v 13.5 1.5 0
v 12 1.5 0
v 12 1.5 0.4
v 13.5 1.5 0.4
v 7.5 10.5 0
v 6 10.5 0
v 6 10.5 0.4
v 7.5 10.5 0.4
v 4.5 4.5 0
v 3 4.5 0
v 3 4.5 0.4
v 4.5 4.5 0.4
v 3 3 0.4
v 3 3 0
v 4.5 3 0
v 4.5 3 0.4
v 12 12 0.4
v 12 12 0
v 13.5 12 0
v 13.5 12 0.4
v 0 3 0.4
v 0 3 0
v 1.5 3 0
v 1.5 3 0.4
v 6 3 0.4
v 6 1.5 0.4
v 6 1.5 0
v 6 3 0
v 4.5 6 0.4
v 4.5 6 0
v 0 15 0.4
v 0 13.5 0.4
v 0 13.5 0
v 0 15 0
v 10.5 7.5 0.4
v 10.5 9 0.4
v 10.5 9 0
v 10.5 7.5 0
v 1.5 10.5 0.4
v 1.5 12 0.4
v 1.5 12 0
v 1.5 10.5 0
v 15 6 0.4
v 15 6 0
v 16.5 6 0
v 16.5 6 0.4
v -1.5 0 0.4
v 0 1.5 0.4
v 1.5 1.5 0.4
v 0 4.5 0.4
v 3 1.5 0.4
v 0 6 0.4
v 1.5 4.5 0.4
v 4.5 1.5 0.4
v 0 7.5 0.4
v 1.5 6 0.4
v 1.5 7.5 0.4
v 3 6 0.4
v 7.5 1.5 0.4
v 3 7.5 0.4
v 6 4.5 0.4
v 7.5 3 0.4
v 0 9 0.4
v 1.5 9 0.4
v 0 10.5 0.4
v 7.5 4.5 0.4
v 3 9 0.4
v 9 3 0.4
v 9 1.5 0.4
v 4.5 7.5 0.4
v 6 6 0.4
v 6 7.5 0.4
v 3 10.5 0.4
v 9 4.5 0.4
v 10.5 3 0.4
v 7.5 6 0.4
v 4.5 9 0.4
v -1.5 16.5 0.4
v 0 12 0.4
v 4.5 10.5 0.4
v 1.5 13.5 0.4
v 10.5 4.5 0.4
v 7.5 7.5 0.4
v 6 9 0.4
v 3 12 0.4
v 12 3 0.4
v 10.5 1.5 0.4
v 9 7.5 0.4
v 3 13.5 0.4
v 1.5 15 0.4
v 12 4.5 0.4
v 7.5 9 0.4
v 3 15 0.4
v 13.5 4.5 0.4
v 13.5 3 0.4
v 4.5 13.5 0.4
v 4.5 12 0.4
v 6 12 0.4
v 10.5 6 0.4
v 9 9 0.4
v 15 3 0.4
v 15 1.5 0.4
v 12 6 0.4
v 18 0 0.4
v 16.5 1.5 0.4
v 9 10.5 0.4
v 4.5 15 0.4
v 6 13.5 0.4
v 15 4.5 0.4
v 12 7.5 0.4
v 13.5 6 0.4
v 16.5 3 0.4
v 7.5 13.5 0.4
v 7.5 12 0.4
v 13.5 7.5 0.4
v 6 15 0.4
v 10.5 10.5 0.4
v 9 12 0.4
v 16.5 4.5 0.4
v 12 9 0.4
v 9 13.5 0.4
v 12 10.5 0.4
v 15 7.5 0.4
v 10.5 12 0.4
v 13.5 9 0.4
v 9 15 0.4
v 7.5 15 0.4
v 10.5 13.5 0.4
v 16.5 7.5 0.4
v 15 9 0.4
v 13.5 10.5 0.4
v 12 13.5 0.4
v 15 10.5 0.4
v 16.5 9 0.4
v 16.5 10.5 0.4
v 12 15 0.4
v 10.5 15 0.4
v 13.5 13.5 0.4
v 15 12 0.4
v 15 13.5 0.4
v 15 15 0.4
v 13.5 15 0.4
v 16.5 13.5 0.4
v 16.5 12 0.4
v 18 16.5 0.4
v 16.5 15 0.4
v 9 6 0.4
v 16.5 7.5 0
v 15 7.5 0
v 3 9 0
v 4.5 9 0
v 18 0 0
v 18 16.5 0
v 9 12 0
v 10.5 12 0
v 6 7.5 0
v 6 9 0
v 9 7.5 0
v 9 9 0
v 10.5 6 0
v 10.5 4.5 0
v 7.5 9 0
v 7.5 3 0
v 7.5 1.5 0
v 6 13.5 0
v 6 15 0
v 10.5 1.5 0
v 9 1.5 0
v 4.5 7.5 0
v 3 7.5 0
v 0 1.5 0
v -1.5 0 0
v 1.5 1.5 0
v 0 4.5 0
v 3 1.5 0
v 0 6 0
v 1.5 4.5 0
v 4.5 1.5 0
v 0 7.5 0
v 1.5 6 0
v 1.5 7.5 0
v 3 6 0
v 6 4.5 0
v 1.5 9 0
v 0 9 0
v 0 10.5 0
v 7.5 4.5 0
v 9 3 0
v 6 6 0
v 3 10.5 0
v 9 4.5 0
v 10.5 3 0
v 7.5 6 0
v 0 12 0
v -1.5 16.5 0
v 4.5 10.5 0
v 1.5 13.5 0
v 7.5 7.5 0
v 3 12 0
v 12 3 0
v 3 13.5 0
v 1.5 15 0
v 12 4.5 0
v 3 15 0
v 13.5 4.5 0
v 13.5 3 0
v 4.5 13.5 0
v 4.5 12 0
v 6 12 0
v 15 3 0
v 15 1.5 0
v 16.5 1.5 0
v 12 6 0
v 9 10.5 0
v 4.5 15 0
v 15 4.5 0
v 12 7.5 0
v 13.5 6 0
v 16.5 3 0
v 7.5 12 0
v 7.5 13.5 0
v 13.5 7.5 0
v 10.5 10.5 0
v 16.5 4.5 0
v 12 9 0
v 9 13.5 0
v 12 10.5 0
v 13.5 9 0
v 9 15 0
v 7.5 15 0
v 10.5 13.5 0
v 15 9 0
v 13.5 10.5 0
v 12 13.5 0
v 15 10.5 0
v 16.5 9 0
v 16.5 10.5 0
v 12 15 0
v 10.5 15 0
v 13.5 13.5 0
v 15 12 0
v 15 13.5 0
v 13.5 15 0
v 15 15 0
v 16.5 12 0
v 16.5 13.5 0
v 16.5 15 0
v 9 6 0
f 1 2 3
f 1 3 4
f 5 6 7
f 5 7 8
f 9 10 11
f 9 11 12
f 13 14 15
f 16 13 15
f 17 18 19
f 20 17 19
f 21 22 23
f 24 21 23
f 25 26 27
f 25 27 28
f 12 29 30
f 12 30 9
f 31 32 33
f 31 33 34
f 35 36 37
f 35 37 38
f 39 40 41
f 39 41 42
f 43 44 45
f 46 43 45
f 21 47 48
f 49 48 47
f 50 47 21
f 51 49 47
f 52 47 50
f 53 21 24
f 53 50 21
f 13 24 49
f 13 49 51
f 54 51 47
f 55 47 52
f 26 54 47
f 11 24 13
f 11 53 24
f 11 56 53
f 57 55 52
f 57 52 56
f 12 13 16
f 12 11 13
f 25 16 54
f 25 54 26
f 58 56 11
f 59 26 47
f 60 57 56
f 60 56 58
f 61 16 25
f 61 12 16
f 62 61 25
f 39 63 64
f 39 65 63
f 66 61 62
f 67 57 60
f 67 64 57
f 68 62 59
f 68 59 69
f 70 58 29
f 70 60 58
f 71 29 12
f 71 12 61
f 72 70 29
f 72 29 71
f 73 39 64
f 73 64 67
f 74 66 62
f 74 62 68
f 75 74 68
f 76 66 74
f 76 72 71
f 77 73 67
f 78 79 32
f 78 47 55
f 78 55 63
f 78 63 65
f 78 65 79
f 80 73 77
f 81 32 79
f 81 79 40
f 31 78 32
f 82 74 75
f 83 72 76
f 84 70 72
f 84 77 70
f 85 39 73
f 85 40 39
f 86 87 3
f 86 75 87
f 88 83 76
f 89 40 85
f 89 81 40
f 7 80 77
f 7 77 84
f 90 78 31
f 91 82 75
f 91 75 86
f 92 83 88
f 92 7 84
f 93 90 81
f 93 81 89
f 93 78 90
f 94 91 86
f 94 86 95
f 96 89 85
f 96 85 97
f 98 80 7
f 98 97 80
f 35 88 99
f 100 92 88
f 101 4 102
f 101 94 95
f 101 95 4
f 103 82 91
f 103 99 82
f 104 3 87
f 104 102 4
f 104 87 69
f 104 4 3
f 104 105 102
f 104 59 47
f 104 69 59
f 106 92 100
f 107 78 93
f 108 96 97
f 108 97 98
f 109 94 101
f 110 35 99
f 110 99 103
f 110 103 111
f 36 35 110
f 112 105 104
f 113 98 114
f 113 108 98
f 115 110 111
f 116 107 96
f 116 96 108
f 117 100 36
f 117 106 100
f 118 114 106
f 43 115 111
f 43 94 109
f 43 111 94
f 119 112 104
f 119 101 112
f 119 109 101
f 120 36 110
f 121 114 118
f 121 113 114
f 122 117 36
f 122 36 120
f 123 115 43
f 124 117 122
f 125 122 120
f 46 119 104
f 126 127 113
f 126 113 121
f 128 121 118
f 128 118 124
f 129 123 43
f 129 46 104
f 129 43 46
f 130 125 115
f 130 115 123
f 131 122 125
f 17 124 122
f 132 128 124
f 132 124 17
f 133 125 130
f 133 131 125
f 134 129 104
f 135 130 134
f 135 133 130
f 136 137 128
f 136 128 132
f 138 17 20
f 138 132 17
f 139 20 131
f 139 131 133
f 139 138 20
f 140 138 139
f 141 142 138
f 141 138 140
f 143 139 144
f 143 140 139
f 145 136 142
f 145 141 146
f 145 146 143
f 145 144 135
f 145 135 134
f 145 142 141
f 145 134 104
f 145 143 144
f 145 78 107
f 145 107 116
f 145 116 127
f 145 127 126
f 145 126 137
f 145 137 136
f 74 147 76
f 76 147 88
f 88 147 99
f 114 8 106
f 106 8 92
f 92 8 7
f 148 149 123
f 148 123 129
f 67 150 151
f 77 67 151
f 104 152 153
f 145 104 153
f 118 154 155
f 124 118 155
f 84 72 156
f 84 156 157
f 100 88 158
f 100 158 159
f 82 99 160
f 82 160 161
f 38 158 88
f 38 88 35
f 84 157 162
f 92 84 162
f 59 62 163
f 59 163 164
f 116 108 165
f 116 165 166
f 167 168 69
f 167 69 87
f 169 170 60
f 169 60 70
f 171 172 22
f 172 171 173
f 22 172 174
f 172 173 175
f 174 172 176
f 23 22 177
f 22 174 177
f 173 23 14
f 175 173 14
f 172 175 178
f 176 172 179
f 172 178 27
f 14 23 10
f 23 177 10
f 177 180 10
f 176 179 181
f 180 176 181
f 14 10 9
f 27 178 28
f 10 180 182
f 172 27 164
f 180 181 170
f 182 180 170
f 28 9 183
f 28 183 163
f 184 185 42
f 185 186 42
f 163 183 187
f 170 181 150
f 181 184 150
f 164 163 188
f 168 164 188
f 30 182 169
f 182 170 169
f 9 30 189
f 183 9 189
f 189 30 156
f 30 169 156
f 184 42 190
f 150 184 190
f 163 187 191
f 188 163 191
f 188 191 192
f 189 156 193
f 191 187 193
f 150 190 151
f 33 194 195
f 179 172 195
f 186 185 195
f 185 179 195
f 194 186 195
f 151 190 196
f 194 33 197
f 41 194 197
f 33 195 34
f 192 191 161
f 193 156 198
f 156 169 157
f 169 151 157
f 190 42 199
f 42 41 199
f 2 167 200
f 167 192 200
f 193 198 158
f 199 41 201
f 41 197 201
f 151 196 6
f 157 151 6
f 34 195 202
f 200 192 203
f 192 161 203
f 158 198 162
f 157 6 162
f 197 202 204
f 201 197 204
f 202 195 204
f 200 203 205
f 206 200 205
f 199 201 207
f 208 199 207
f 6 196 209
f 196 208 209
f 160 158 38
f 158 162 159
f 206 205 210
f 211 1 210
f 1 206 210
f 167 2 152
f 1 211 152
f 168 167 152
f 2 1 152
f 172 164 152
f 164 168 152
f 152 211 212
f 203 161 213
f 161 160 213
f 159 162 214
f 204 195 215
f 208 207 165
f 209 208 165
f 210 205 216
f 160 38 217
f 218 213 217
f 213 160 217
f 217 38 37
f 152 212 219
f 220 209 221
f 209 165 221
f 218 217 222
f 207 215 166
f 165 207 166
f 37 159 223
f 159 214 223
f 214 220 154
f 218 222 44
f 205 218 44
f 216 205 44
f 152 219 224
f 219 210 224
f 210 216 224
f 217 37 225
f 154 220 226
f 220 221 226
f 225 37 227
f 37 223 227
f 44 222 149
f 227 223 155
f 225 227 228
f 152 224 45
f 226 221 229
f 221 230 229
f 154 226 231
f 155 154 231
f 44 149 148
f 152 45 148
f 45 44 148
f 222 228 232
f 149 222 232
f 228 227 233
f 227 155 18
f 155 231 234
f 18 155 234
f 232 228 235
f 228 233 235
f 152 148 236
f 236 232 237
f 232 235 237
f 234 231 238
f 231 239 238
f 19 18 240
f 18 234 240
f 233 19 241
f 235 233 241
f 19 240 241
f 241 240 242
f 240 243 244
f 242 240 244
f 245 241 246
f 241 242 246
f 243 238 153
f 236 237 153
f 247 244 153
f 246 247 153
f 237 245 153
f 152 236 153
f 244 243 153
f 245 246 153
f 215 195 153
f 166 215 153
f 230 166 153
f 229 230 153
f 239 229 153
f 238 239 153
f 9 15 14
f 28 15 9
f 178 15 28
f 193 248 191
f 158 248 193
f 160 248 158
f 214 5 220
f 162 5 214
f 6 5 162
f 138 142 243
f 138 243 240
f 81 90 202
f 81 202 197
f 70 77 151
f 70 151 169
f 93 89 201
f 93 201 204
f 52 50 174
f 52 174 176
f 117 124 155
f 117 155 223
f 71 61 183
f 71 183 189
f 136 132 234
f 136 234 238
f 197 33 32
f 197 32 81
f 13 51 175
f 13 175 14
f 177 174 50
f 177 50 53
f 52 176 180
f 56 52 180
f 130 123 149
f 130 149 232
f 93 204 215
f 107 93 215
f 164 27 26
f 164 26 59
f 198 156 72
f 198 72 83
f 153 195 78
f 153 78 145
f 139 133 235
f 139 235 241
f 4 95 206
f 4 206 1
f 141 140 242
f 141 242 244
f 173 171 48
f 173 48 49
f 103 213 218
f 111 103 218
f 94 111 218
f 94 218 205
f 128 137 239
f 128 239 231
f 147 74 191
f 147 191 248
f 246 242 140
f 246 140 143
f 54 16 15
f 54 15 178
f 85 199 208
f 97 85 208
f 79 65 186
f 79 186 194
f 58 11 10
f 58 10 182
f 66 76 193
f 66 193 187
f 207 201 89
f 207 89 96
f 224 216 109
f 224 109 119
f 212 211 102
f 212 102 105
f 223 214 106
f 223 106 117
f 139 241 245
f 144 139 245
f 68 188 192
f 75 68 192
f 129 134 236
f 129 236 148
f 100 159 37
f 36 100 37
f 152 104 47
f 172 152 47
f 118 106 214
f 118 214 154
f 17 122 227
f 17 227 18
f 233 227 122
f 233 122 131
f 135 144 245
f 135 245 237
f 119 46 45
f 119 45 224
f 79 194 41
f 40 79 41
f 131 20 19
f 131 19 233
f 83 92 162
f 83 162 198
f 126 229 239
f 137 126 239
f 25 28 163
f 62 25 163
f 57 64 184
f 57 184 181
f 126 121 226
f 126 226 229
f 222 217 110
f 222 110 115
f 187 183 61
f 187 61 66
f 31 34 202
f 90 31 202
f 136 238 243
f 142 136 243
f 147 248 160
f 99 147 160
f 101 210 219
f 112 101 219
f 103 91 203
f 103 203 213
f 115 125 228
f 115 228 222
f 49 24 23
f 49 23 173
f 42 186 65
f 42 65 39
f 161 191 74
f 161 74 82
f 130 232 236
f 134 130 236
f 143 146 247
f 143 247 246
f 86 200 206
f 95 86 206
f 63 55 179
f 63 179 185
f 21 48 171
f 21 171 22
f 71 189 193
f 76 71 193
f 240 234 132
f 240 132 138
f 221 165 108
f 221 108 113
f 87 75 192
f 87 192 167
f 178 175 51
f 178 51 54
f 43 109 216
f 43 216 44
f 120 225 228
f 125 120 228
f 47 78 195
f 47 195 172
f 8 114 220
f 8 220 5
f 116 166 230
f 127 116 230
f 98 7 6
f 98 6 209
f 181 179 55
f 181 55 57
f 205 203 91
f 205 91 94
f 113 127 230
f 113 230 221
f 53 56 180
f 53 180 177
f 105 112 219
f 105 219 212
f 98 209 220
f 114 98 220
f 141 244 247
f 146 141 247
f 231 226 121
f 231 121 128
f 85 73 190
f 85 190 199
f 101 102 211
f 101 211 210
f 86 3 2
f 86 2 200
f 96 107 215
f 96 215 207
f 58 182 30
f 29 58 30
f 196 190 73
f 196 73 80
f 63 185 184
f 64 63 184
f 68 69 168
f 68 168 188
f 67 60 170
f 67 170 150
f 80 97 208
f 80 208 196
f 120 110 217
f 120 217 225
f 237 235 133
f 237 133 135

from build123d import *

# Parameters (mm, degrees)
SKETCH_1_W             = 18
SKETCH_1_H             = 1.5
EXTRUDE_1_DEPTH        = 0.4
PATTERN_LINEAR_1_COUNT = 6
PATTERN_LINEAR_1_PITCH = 3
EXTRUDE_3_DEPTH        = 0.4
PATTERN_LINEAR_2_COUNT = 7
PATTERN_LINEAR_2_PITCH = 3


with BuildPart() as part:
    # 草图1 → 凸台-拉伸1 (new body)
    with BuildSketch(Plane.XY):
        with Locations((9, 0.75)):
            Rectangle(SKETCH_1_W, SKETCH_1_H)
    extrude(amount=EXTRUDE_1_DEPTH)


with BuildPart() as pattern_linear_1_1:
    # 阵列(线性)1: pattern copy
    add(part.part.moved(Location(Vector(0, 1, 0) * (1 * PATTERN_LINEAR_1_PITCH))))


with BuildPart() as pattern_linear_1_2:
    # 阵列(线性)1: pattern copy
    add(part.part.moved(Location(Vector(0, 1, 0) * (2 * PATTERN_LINEAR_1_PITCH))))


with BuildPart() as pattern_linear_1_3:
    # 阵列(线性)1: pattern copy
    add(part.part.moved(Location(Vector(0, 1, 0) * (3 * PATTERN_LINEAR_1_PITCH))))


with BuildPart() as pattern_linear_1_4:
    # 阵列(线性)1: pattern copy
    add(part.part.moved(Location(Vector(0, 1, 0) * (4 * PATTERN_LINEAR_1_PITCH))))


with BuildPart() as pattern_linear_1_5:
    # 阵列(线性)1: pattern copy
    add(part.part.moved(Location(Vector(0, 1, 0) * (5 * PATTERN_LINEAR_1_PITCH))))


with BuildPart() as part_1:
    add(part.part)

    add(pattern_linear_1_1.part)  # 凸台-拉伸3 merges 阵列(线性)1_1

    add(pattern_linear_1_2.part)  # 凸台-拉伸3 merges 阵列(线性)1_2

    add(pattern_linear_1_3.part)  # 凸台-拉伸3 merges 阵列(线性)1_3
    # 草图3 → 凸台-拉伸3 (add)
    with BuildSketch(Plane.XY.offset(0.4)):
        Polygon((0, 16.5), (0, 10.5), (0, 0), (-1.5, 0), (-1.5, 10.98507125), (-1.5, 16.5), align=None)
    extrude_3 = extrude(amount=-EXTRUDE_3_DEPTH)

    # 阵列(线性)2: 凸台-拉伸3 ×7
    with Locations(*[(i * PATTERN_LINEAR_2_PITCH, 0, 0) for i in range(1, PATTERN_LINEAR_2_COUNT)]):
        add(extrude_3)

    # Combine 1: read off the stored shape, not the designer's step
    # Combine 1: union 阵列(线性)1_4, 阵列(线性)1_5
    add(pattern_linear_1_4.part)
    add(pattern_linear_1_5.part)


solid = part_1.part
